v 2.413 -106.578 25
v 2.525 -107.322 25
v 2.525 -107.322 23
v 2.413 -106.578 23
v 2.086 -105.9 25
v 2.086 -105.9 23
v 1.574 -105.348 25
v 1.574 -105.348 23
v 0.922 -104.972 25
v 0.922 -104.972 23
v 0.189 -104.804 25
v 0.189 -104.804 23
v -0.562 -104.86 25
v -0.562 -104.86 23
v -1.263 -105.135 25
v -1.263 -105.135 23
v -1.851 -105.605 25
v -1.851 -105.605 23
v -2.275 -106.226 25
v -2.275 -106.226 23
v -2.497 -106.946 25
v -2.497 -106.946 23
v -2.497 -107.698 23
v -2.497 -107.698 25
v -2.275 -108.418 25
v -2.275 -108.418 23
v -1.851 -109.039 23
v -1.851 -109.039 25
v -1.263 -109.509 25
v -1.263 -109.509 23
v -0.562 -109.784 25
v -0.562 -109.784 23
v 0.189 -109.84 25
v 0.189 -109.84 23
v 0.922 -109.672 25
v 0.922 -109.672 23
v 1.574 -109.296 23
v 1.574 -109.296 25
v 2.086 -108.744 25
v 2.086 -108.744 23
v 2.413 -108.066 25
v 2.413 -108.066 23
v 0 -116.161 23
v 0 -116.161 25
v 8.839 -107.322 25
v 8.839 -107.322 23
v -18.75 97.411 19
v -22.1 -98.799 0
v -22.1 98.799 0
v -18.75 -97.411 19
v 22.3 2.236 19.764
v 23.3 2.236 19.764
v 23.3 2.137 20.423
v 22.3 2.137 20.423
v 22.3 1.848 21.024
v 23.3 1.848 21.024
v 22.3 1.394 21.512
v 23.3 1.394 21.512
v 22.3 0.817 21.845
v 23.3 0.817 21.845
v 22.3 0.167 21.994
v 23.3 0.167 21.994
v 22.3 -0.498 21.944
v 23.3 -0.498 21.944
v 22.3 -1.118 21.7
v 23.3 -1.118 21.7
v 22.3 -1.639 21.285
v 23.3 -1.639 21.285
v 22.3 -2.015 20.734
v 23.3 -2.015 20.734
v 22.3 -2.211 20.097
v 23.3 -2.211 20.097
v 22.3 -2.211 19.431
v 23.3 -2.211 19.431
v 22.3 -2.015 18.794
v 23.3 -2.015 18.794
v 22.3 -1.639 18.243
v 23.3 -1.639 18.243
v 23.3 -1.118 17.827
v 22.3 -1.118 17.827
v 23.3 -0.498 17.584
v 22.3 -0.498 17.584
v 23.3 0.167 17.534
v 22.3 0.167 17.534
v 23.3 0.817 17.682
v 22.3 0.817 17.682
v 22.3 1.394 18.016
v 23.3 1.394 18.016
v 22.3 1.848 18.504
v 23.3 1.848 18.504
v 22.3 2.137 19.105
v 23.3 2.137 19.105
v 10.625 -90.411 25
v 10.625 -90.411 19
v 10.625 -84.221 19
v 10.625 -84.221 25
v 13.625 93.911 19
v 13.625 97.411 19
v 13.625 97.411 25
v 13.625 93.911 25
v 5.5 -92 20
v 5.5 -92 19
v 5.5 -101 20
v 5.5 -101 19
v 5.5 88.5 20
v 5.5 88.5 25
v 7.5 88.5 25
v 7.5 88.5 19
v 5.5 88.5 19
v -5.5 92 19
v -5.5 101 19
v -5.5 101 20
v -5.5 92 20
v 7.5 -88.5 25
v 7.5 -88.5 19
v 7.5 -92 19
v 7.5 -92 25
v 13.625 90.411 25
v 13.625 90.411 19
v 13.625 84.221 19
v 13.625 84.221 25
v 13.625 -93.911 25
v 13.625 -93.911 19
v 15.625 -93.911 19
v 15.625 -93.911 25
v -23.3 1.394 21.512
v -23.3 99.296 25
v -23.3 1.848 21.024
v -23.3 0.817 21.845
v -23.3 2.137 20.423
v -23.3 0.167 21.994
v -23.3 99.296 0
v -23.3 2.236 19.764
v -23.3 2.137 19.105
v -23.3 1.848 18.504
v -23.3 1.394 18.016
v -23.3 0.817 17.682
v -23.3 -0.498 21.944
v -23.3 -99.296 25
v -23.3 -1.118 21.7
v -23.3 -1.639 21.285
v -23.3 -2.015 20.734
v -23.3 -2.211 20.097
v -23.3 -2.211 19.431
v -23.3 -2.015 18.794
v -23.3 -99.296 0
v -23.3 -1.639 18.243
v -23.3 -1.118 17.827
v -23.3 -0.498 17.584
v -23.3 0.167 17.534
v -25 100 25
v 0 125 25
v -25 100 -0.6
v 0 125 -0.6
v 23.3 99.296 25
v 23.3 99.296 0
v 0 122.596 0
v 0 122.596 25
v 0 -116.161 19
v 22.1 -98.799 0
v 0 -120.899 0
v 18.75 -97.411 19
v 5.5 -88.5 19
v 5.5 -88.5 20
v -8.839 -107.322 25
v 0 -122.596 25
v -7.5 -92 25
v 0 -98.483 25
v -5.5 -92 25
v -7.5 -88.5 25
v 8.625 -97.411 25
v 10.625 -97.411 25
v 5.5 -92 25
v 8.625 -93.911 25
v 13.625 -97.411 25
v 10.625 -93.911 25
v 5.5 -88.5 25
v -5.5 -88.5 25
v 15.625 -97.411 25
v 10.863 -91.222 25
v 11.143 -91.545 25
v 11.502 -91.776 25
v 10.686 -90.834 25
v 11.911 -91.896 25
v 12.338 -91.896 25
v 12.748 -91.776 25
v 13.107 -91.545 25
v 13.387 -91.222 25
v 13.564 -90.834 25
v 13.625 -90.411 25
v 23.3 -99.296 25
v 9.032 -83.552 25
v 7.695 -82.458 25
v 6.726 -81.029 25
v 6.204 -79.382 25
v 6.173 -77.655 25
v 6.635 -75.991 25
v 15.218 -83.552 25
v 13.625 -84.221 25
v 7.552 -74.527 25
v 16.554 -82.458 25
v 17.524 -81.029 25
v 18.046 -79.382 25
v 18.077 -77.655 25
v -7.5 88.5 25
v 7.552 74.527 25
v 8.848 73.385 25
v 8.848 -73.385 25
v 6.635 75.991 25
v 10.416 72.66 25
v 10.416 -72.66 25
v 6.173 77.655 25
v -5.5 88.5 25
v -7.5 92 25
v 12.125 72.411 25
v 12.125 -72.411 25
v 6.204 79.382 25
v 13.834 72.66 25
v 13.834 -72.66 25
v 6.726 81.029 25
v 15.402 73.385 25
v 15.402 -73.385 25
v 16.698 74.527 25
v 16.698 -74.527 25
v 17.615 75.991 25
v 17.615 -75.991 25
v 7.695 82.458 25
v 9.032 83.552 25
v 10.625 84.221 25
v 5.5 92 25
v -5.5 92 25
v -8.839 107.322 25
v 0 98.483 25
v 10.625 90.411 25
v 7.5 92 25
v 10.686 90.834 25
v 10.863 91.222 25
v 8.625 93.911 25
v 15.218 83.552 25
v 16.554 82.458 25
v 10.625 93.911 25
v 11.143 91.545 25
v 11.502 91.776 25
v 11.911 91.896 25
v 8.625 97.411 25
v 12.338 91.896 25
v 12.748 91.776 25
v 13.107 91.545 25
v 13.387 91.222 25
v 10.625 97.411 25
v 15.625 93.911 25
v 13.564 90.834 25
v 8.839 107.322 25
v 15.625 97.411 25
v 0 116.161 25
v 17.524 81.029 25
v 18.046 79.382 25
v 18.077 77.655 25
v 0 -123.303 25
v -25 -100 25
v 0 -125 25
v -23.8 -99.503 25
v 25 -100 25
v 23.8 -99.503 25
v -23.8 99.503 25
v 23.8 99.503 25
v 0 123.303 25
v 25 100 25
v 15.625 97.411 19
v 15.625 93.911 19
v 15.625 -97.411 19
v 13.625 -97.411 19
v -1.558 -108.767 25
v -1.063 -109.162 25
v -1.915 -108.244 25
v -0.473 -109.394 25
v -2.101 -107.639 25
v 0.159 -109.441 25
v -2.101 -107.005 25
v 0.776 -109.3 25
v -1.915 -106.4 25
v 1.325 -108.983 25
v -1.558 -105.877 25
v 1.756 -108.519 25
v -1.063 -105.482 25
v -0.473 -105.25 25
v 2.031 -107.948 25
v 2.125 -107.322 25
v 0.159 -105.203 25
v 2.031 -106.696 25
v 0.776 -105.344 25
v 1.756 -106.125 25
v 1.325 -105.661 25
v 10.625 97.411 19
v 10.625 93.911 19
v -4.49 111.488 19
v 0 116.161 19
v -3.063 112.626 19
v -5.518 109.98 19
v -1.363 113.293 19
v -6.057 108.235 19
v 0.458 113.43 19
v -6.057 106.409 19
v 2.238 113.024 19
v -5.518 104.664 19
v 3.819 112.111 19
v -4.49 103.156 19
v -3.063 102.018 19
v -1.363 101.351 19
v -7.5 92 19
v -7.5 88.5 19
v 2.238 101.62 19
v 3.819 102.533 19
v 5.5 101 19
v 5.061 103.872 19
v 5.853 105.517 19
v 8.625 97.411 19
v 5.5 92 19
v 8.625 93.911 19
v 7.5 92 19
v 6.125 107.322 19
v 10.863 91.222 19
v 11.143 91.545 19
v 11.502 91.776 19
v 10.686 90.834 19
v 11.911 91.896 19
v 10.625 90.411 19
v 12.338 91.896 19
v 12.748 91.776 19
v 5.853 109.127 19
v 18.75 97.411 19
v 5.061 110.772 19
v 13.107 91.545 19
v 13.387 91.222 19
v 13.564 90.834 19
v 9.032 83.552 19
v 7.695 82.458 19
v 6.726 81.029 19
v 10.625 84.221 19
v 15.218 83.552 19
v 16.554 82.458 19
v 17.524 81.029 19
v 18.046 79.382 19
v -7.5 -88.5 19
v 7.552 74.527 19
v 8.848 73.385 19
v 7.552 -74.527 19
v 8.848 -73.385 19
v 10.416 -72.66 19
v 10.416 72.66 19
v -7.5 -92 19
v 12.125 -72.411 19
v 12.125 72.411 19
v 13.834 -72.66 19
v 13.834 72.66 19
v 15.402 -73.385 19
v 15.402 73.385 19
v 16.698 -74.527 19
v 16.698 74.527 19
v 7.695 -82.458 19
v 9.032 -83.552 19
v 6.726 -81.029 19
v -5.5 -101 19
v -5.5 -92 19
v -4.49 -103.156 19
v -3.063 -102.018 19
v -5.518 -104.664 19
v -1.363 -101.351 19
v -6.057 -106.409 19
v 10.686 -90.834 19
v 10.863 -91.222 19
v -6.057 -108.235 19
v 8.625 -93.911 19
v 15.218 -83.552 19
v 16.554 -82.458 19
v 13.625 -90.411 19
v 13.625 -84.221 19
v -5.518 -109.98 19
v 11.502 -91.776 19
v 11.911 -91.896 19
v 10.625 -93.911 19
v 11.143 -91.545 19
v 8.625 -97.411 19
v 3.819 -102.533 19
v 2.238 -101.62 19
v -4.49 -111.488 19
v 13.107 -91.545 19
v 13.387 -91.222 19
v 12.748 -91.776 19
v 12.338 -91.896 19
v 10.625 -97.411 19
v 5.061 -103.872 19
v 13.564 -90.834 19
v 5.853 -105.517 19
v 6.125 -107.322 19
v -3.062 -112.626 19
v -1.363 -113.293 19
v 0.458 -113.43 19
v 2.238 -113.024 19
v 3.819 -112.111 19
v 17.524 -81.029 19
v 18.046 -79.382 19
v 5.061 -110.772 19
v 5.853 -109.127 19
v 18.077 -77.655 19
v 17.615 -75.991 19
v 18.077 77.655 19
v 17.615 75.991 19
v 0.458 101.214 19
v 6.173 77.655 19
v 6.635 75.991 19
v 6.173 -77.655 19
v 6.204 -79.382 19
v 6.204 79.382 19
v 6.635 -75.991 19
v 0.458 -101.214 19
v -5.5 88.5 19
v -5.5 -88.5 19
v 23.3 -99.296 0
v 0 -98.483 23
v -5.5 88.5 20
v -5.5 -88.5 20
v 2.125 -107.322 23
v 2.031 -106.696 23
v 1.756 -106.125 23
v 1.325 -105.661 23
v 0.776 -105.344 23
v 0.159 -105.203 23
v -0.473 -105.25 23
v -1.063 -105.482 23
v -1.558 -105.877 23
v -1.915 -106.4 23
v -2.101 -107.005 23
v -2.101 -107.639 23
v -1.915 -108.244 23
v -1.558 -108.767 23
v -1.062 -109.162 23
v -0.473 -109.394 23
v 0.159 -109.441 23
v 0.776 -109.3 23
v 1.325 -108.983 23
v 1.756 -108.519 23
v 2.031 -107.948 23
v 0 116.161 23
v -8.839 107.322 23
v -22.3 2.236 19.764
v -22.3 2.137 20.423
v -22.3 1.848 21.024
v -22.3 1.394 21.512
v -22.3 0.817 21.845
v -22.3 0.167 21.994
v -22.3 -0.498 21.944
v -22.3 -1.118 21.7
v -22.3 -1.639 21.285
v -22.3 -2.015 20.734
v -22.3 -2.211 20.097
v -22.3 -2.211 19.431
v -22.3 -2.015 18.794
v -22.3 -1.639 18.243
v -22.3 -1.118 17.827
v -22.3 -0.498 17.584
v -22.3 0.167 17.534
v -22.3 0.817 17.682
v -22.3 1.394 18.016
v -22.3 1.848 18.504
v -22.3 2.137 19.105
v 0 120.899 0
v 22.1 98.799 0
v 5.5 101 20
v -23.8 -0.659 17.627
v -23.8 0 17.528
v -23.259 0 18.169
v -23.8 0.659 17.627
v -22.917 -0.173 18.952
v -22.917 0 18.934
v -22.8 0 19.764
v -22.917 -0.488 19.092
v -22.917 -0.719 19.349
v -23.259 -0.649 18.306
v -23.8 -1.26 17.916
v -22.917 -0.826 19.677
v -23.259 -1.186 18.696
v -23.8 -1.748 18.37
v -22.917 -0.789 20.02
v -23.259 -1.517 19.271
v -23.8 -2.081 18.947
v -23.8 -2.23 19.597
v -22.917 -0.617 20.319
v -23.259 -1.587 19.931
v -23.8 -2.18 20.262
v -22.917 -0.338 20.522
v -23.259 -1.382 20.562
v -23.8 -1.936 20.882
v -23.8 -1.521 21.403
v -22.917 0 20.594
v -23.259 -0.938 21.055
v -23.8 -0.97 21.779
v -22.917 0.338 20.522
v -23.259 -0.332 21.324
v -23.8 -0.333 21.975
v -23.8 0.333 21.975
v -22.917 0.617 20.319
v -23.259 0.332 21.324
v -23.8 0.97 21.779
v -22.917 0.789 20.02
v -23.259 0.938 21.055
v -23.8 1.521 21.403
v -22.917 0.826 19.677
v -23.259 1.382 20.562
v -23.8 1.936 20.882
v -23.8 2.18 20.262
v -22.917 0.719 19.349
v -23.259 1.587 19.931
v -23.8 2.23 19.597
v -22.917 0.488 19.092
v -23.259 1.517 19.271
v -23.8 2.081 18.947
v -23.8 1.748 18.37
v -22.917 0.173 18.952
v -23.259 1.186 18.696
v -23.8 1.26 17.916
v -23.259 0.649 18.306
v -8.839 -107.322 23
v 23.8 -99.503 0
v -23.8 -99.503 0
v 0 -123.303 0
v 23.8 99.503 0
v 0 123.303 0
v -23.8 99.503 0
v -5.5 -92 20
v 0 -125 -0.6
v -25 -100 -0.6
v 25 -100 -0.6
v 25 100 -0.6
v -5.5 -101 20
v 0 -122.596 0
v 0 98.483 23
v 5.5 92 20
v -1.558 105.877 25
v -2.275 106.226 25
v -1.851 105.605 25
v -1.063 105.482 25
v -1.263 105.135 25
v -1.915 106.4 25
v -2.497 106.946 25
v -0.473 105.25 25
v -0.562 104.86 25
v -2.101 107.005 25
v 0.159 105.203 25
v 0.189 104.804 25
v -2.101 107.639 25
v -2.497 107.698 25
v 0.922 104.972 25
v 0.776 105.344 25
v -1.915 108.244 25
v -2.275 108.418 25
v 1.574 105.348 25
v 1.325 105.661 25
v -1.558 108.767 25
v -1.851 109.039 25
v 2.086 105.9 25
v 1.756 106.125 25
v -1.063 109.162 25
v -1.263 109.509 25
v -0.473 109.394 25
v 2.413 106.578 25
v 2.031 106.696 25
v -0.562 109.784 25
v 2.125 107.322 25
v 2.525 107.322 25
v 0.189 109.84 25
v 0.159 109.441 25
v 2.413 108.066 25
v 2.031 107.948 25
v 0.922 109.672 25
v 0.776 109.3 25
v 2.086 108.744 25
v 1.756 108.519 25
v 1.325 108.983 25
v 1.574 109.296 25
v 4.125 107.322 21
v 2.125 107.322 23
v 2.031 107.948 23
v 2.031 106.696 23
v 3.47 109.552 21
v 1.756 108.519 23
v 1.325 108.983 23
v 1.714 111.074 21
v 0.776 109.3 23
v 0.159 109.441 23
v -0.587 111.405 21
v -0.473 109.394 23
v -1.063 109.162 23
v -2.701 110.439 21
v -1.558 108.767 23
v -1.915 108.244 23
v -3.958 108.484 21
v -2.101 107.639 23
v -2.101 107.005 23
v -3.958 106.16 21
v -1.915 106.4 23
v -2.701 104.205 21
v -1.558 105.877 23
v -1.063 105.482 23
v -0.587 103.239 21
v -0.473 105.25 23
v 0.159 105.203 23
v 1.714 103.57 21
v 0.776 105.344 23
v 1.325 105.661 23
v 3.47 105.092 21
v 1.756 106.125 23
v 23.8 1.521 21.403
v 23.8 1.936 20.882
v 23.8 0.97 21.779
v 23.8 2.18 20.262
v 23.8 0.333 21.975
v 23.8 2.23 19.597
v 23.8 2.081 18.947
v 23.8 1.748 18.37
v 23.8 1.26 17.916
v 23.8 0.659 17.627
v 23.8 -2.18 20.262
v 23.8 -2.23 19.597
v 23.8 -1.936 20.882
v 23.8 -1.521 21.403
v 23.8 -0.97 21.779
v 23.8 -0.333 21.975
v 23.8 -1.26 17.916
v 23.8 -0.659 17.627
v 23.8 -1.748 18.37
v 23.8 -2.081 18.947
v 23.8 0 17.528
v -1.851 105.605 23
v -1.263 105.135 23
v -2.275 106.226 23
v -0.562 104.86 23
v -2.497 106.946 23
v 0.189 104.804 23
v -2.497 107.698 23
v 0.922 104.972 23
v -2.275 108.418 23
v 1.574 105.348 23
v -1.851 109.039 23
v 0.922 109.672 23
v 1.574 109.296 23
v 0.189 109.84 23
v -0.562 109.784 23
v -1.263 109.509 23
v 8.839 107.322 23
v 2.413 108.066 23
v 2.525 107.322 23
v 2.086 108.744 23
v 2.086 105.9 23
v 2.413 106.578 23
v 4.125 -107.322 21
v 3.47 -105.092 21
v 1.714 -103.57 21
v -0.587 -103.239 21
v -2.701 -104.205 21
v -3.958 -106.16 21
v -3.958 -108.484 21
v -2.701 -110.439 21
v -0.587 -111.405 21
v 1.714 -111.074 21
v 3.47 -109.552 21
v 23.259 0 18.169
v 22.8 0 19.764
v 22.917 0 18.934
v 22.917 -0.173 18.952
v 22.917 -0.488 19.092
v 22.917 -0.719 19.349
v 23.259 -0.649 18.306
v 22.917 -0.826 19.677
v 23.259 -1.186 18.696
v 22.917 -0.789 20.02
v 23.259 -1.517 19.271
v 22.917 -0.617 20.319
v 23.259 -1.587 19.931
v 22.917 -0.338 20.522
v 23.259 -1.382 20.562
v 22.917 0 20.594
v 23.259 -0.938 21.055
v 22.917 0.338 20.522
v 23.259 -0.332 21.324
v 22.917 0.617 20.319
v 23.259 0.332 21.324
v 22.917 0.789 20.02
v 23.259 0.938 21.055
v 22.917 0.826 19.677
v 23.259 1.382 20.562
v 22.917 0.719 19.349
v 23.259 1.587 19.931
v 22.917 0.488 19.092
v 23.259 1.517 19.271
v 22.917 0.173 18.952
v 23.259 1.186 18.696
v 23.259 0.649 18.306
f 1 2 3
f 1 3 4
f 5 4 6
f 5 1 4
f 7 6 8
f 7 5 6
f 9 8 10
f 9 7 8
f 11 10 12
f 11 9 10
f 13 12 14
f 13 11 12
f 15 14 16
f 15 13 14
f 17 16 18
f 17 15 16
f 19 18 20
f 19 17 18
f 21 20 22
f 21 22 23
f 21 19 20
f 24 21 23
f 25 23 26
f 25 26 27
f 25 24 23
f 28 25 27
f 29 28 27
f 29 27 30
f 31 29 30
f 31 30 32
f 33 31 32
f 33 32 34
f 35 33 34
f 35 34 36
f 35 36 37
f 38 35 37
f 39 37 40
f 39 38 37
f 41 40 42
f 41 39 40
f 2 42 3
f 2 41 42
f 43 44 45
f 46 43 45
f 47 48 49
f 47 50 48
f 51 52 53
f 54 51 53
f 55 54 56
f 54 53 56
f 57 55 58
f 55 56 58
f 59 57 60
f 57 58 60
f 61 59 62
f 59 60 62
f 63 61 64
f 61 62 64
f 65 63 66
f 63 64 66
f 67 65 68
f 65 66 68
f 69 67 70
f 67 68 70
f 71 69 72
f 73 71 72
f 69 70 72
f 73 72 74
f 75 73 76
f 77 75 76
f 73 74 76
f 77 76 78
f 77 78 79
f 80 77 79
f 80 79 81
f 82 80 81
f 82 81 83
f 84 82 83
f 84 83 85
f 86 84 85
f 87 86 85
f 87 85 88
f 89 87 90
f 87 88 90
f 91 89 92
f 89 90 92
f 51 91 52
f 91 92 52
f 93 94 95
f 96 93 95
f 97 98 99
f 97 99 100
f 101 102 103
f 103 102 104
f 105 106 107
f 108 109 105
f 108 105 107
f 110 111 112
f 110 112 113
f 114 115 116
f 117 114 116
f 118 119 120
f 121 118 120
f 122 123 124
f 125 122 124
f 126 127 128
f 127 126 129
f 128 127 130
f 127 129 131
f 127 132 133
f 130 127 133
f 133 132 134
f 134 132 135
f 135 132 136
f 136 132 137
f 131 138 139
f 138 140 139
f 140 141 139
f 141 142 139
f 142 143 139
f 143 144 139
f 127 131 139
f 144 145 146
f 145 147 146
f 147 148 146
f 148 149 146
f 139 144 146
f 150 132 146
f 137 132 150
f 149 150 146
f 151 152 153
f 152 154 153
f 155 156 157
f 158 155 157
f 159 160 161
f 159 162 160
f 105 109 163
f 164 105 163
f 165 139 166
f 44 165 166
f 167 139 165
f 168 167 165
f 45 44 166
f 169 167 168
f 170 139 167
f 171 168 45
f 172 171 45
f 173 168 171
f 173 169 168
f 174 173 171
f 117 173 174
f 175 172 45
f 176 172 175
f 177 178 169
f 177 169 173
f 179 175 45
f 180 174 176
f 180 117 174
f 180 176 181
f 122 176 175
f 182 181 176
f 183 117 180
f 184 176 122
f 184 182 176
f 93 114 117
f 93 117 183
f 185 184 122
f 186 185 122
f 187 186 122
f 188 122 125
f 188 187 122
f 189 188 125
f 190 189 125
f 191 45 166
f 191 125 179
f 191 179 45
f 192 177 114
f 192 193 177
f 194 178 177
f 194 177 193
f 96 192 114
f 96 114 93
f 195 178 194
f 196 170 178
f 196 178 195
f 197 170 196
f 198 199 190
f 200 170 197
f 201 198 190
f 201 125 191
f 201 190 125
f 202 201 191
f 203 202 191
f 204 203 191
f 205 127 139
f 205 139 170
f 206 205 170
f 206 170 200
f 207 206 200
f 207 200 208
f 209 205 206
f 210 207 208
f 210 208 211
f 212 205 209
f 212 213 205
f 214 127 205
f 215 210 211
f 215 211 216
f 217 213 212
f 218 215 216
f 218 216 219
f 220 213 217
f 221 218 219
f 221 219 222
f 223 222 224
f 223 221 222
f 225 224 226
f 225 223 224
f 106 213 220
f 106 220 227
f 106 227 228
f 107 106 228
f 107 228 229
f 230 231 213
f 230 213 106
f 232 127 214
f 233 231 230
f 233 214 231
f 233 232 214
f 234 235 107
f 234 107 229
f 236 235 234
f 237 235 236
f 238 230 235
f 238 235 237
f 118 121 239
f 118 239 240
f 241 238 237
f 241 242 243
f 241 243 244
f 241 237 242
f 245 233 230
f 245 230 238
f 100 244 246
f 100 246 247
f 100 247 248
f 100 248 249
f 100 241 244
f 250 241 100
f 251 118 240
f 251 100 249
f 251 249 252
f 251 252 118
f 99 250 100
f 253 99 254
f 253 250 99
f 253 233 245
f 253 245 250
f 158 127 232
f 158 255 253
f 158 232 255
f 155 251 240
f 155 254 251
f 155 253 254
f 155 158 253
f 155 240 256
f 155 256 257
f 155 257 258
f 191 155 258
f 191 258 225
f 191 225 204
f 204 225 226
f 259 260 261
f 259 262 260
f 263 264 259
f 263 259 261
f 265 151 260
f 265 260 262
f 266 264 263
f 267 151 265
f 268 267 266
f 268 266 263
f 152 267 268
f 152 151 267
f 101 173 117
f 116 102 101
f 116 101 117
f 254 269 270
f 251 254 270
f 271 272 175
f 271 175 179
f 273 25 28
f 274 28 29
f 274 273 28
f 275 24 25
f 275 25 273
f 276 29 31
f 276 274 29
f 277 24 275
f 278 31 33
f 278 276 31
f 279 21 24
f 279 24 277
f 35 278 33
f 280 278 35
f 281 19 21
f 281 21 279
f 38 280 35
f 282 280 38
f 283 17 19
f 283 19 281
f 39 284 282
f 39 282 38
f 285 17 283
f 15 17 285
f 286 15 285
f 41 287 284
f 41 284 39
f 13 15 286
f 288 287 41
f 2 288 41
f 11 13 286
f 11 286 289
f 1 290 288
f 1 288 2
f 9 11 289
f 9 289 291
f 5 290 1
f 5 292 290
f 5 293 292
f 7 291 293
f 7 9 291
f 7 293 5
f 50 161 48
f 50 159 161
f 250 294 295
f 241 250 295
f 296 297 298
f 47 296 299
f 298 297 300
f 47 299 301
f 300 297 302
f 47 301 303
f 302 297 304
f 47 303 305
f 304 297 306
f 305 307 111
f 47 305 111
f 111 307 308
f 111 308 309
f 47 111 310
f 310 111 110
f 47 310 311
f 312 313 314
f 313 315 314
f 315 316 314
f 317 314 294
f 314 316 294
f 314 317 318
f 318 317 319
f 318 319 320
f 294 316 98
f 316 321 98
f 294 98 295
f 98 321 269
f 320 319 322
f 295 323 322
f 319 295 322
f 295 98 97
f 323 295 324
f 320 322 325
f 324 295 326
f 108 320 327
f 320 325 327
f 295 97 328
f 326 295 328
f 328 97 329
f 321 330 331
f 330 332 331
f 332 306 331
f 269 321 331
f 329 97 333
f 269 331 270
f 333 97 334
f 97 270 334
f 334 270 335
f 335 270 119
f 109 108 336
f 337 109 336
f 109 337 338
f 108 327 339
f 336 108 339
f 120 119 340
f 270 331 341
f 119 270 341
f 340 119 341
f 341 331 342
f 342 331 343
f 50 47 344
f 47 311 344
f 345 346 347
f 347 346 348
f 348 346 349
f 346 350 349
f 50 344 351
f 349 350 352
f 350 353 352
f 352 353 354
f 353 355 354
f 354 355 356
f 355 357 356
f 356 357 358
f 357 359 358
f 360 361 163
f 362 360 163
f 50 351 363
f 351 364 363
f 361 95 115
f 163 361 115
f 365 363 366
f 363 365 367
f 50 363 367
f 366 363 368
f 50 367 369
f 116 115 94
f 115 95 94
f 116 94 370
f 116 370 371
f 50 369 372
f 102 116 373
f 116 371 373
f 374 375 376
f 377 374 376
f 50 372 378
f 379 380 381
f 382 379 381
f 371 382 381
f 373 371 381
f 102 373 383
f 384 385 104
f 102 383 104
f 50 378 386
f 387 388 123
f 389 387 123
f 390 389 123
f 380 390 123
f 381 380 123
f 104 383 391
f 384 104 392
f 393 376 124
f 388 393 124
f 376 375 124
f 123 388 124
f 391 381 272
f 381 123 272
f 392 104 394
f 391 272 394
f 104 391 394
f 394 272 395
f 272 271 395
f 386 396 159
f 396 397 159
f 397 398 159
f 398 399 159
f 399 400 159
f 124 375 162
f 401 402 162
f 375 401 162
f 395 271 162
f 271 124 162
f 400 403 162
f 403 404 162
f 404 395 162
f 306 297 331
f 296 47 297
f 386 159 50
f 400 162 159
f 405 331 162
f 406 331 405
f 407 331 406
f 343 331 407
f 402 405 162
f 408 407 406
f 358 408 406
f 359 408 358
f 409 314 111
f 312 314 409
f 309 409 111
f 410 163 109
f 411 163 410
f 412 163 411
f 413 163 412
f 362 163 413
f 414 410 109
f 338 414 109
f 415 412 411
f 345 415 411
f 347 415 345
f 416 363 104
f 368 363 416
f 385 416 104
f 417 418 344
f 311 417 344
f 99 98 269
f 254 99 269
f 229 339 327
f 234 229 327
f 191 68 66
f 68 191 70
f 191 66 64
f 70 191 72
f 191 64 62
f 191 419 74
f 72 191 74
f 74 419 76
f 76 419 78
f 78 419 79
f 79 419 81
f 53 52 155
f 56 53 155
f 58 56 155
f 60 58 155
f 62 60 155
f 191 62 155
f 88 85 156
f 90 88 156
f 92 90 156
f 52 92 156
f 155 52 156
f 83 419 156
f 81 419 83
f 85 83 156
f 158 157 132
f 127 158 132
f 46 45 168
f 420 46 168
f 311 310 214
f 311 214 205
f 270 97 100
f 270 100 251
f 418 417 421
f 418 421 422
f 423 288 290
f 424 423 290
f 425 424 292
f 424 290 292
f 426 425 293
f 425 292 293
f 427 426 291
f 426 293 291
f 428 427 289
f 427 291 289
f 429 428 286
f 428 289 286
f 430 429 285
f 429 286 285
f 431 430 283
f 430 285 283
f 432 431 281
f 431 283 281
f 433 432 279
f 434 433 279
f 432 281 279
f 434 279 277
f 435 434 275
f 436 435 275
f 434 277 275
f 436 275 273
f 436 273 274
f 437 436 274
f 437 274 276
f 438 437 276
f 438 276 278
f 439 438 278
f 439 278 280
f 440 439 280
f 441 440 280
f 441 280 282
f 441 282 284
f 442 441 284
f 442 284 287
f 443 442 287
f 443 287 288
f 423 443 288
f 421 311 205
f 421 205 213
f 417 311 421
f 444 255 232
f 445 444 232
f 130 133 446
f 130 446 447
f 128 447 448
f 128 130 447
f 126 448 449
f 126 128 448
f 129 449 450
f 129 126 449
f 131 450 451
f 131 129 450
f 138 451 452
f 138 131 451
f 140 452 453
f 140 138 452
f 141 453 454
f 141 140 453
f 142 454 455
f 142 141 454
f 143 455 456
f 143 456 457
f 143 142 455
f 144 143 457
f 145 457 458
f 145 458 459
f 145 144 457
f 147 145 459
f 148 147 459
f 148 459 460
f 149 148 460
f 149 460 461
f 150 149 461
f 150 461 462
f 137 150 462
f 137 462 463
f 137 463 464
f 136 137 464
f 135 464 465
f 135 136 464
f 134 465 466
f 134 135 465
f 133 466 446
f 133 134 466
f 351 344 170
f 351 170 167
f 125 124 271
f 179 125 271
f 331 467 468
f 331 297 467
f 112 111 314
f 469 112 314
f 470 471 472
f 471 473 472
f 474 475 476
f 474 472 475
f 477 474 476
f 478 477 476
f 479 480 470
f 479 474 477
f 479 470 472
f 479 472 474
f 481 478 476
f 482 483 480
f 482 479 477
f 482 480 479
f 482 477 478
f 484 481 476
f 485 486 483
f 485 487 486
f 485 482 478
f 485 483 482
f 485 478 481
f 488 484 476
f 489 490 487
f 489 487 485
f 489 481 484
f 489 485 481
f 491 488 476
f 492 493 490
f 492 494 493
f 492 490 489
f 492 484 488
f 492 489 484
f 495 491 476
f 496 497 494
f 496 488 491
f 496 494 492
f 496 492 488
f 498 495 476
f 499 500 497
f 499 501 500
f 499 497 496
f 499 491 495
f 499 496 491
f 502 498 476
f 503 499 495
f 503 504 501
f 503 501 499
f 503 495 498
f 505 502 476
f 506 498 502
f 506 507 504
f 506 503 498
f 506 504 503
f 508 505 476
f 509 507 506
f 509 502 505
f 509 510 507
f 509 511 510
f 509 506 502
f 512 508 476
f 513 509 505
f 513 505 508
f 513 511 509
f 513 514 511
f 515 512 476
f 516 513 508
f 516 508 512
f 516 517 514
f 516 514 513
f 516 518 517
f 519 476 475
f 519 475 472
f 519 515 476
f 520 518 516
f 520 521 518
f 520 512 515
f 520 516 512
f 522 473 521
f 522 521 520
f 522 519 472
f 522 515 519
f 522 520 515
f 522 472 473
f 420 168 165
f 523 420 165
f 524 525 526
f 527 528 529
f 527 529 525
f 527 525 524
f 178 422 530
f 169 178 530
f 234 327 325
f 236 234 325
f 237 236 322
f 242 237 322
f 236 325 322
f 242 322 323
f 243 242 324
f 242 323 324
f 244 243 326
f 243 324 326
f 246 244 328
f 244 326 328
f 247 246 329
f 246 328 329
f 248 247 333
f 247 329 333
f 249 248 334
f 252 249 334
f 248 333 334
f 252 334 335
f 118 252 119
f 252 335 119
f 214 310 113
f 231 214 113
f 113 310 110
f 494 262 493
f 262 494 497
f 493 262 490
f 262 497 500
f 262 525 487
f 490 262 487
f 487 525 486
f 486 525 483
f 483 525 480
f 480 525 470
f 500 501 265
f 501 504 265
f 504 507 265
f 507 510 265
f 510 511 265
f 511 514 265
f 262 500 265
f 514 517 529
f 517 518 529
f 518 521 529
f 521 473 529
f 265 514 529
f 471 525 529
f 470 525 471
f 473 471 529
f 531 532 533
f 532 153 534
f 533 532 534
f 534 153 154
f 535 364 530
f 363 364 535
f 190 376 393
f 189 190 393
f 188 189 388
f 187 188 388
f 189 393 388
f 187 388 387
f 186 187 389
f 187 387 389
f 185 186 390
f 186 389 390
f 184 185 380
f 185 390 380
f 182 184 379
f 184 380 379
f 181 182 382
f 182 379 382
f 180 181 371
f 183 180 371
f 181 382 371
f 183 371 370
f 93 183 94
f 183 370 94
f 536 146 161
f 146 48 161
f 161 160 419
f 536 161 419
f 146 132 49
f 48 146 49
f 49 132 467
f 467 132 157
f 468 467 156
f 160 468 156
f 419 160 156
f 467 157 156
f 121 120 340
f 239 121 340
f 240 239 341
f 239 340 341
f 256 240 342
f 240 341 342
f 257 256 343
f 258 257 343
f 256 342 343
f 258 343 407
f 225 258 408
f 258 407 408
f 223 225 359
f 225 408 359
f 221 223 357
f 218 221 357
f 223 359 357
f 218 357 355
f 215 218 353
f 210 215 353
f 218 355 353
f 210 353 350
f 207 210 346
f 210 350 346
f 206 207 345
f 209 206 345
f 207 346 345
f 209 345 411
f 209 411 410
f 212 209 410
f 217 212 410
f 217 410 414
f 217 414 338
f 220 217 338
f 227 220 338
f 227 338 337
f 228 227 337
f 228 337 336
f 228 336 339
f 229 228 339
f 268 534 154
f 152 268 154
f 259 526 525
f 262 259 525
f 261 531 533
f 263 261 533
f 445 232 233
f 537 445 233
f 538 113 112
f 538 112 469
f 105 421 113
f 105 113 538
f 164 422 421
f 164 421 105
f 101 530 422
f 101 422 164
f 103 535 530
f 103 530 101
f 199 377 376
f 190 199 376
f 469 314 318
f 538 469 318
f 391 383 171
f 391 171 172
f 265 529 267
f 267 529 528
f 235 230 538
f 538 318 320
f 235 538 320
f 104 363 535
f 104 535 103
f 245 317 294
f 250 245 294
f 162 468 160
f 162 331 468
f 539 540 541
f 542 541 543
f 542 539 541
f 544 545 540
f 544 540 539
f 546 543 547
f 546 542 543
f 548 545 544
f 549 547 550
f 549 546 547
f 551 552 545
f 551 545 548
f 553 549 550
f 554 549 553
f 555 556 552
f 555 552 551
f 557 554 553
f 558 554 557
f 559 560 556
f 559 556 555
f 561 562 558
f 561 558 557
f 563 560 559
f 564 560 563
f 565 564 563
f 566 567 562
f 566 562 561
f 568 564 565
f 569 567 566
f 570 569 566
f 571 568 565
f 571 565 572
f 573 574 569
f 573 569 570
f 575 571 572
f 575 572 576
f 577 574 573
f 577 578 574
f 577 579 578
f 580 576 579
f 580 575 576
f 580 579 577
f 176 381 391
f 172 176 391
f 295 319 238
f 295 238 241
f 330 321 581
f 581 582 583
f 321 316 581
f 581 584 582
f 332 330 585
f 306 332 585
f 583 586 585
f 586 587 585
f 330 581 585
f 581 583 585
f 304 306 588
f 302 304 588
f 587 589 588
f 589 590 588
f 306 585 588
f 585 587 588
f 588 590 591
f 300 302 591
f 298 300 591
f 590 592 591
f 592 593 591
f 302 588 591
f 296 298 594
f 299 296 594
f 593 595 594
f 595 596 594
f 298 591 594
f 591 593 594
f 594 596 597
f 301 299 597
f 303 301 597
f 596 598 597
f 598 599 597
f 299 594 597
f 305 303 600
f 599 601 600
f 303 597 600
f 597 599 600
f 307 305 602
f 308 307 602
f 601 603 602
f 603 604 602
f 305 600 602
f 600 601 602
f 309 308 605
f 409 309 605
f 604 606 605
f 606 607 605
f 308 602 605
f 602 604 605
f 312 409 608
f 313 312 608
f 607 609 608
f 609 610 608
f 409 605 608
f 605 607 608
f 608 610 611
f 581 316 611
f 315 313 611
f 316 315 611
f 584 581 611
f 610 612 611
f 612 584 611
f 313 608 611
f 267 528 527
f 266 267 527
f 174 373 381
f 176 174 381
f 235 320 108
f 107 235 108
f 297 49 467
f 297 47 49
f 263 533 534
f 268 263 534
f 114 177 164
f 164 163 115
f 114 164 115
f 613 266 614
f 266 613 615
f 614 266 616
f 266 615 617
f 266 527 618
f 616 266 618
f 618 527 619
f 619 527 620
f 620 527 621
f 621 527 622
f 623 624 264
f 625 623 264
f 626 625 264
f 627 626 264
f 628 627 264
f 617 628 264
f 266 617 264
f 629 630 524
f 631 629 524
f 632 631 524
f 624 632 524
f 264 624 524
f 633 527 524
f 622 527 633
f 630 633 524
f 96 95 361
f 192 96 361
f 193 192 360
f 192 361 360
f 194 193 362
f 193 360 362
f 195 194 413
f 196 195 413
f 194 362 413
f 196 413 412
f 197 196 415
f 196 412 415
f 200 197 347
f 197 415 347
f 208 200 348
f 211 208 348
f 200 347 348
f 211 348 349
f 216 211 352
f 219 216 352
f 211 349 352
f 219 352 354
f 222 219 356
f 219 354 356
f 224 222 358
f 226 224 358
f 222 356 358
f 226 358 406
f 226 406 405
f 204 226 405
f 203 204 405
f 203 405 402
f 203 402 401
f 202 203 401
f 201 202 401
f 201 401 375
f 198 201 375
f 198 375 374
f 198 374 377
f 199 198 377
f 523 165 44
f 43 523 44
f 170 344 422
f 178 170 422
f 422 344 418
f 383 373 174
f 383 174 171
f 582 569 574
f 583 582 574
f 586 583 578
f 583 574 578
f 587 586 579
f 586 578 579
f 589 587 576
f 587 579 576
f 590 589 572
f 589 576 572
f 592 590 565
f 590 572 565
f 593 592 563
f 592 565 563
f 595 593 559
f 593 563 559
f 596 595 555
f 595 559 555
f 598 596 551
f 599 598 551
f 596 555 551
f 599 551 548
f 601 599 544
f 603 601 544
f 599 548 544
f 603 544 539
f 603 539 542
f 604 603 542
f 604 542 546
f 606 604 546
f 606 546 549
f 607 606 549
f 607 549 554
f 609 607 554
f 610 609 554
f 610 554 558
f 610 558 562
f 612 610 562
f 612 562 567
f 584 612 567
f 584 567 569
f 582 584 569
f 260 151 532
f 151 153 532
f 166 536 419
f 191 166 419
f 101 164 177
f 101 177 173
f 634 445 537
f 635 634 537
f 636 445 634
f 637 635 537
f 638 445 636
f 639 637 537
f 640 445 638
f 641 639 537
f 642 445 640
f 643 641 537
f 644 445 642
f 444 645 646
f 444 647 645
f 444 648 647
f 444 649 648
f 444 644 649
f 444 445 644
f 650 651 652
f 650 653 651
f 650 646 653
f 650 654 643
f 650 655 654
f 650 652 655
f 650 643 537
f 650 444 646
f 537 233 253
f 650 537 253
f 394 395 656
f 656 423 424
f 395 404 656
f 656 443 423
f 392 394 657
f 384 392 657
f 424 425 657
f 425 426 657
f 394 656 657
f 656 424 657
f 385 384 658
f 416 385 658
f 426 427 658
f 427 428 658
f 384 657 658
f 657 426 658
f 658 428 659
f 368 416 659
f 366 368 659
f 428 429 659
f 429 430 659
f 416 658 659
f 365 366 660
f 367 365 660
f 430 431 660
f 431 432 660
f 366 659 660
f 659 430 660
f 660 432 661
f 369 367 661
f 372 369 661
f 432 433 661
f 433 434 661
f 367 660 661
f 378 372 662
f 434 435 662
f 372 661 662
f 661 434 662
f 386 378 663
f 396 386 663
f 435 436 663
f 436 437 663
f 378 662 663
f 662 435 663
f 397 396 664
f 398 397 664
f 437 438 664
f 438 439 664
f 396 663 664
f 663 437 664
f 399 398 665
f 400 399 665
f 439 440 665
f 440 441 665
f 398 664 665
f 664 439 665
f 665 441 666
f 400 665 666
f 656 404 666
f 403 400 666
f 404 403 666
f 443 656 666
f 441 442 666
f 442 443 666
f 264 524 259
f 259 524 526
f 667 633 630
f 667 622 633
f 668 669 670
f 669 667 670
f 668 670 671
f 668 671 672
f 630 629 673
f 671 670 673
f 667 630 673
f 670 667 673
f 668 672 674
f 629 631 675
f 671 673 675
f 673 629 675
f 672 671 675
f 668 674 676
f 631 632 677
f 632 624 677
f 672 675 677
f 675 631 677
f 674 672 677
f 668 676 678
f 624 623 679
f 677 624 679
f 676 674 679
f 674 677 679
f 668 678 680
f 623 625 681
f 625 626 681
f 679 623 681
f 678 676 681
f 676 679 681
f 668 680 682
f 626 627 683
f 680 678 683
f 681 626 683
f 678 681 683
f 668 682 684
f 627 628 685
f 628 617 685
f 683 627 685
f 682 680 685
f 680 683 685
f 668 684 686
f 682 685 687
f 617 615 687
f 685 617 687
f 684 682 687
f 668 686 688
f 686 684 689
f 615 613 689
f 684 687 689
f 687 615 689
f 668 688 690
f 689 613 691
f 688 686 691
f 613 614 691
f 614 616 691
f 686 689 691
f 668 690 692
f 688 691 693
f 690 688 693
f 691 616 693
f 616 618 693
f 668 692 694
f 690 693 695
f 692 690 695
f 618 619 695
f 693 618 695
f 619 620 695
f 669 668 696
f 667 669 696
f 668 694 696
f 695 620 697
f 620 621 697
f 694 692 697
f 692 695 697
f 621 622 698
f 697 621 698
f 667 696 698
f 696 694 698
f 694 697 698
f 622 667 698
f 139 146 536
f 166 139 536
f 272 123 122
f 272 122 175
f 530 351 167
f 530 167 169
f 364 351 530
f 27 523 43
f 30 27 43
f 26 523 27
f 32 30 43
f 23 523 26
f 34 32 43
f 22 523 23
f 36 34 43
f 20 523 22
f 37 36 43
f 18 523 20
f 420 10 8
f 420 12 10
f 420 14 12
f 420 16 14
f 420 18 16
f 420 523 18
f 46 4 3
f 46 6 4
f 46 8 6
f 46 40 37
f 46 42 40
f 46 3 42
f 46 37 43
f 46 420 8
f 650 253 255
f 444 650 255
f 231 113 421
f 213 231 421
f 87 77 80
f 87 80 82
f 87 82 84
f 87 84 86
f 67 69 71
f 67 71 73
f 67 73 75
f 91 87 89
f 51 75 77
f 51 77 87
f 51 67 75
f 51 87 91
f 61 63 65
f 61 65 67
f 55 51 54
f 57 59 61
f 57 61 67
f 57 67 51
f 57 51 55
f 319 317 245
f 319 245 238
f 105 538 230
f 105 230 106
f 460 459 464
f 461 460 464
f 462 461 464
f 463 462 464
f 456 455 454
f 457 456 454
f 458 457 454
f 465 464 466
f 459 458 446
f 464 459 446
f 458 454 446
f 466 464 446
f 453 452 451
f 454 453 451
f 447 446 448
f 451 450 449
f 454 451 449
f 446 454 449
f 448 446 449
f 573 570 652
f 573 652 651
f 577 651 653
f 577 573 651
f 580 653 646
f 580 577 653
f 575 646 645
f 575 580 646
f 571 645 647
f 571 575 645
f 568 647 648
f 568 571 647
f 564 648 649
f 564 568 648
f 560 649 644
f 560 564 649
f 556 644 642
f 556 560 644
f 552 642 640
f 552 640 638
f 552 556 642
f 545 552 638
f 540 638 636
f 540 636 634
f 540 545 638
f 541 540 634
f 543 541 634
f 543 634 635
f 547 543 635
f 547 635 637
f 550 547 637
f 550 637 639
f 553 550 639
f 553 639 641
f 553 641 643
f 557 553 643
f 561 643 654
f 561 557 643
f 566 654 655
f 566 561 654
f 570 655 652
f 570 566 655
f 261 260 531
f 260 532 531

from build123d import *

# Parameters (mm, degrees)
F1_DEPTH       = 0.6
F2_DEPTH       = 25
F6_DEPTH       = 25
F7_R           = 2.2360679775
F8_DEPTH       = 1
F10_DEPTH      = 19
F10_TAPER      = 10
F11_R          = 2.525
F12_DEPTH      = 2
F13_R          = 2.125
F14_DEPTH      = 25.601
F14_DEPTH_BACK = 265
F15_SIZE       = 4
F16_W          = 11
F16_H          = 202
F17_DEPTH      = 1
F18_W          = 2
F18_H          = 3.5
F19_DEPTH      = 6.001


# Not quite as in the source:
# - an extrude ends at something that could not be found from the text; its depth is read off the source's solid
# - a pattern or mirror of a feature is missing from the dataset's text; its kind, count and spacing are read off the source's solid


with BuildPart() as f1:
    # F0 (on Top) → F1 (new body)
    with BuildSketch(Plane.XY):
        Polygon((25, 100), (0, 125), (-25, 100), (-25, -100), (0, -125), (25, -100), align=None)
        Polygon((23.8, 99.5029437252), (23.8, -99.5029437252), (0, -123.3029437252), (-23.8, -99.5029437252), (-23.8, 99.5029437252), (0, 123.3029437252), align=None, mode=Mode.SUBTRACT)
        Polygon((0, -123.3029437252), (23.8, -99.5029437252), (23.8, 99.5029437252), (0, 123.3029437252), (-23.8, 99.5029437252), (-23.8, -99.5029437252), align=None)
    extrude(amount=-F1_DEPTH)

    # F0 (on Top) → F2 (join)
    with BuildSketch(Plane.XY):
        Polygon((25, 100), (0, 125), (-25, 100), (-25, -100), (0, -125), (25, -100), align=None)
        Polygon((23.8, 99.5029437252), (23.8, -99.5029437252), (0, -123.3029437252), (-23.8, -99.5029437252), (-23.8, 99.5029437252), (0, 123.3029437252), align=None, mode=Mode.SUBTRACT)
    extrude(amount=F2_DEPTH)

    # F3 (on Front) → F4 (revolve)
    with BuildSketch(Plane.XZ):
        with BuildLine():
            Line((23.8, 17.527864045), (23.8, 19.7639320225))
            Line((23.8, 19.7639320225), (22.8, 19.7639320225))
            ThreePointArc((22.8, 19.7639320225), (23.0613872125, 18.5391871511), (23.8, 17.527864045))
        make_face()
    f4 = revolve(axis=Axis((23.3, 0, 19.7639320225), (-1, 0, 0)))

    # F4_copies: F4 across plane
    add(f4.mirror(Plane(origin=(0, 0, 0), x_dir=(0, 0, -1), z_dir=(-1, 0, 0))))


with BuildPart() as f6:
    # F5 (on face) → F6 (new body, through all)
    with BuildSketch(Plane.XY):
        Polygon((23.3, 99.295836944), (0, 122.595836944), (-23.3, 99.295836944), (-23.3, -99.295836944), (0, -122.595836944), (23.3, -99.295836944), align=None)
    extrude(amount=F6_DEPTH)

    # F7 (on face) → F8 (cut)
    with BuildSketch(Plane.YZ.offset(23.3)):
        with Locations((0, 19.7639320225)):
            Circle(F7_R)
    f8 = extrude(amount=-F8_DEPTH, mode=Mode.SUBTRACT)

    # F8_copies: F8 across plane
    add(f8.mirror(Plane(origin=(0, 0, 0), x_dir=(0, 0, -1), z_dir=(-1, 0, 0))), mode=Mode.SUBTRACT)

    # F9 (on face) → F10 (cut)
    with BuildSketch(Plane(origin=(0, 0, 0), x_dir=(1, 0, 0), z_dir=(0, 0, -1))):
        Polygon((0, -120.8987806691), (22.1, -98.7987806691), (22.1, 98.7987806691), (0, 120.8987806691), (-22.1, 98.7987806691), (-22.1, -98.7987806691), align=None)
    extrude(amount=-F10_DEPTH, taper=F10_TAPER, mode=Mode.SUBTRACT)

    # F11 (on face) → F12 (cut)
    with BuildSketch(Plane.XY.offset(25)):
        Polygon((8.8388347648, 107.3220297612), (0, 116.160864526), (-8.8388347648, 107.3220297612), (0, 98.4831949964), align=None)
        with Locations((0, 107.3220297612)):
            Circle(F11_R, mode=Mode.SUBTRACT)
        Polygon((-8.8388347648, -107.3220297612), (0, -116.160864526), (8.8388347648, -107.3220297612), (0, -98.4831949964), align=None)
        with Locations((0, -107.3220297612)):
            Circle(F11_R, mode=Mode.SUBTRACT)
    extrude(amount=-F12_DEPTH, mode=Mode.SUBTRACT)

    # F13 (on face) → F14 (cut, two sides)
    with BuildSketch(Plane.XY.offset(25)) as f14_sk:
        with Locations((0, -107.3220297612)):
            Circle(F13_R)
        with Locations((0, 107.3220297612)):
            Circle(F13_R)
    extrude(amount=-F14_DEPTH, mode=Mode.SUBTRACT)
    extrude(f14_sk.sketch, amount=F14_DEPTH_BACK, mode=Mode.SUBTRACT)

    # F15
    f15_edges = [f6.edges().sort_by_distance(p)[0] for p in [
        (-2.125, -107.32203, 19),
        (-2.125, 107.32203, 19),
    ]]
    chamfer(f15_edges, length=F15_SIZE)

    # F16 (on face) → F17 (cut)
    with BuildSketch(Plane(origin=(0, 0, 19), x_dir=(1, 0, 0), z_dir=(0, 0, -1))):
        Rectangle(F16_W, F16_H)
    extrude(amount=-F17_DEPTH, mode=Mode.SUBTRACT)

    # F18 (on face) → F19 (cut, through all)
    with BuildSketch(Plane(origin=(0, 0, 19), x_dir=(1, 0, 0), z_dir=(0, 0, -1))):
        with Locations((-6.5, -90.25)):
            Rectangle(F18_W, F18_H)
        with Locations((6.5, -90.25)):
            Rectangle(F18_W, F18_H)
        with Locations((-6.5, 90.25)):
            Rectangle(F18_W, F18_H)
        with Locations((6.5, 90.25)):
            Rectangle(F18_W, F18_H)
        with BuildLine():
            ThreePointArc((10.6248936833, 84.2205521788), (12.1248936833, 72.4110771595), (13.6248936833, 84.2205521788))
            Line((13.6248936833, 84.2205521788), (13.6248936833, 90.4110771595))
            ThreePointArc((13.6248936833, 90.4110771595), (12.1248936833, 91.9110771595), (10.6248936833, 90.4110771595))
            Line((10.6248936833, 90.4110771595), (10.6248936833, 84.2205521788))
        make_face()
        with Locations((9.6248936833, 95.6610771595)):
            Rectangle(F18_W, F18_H)
        with Locations((14.6248936833, 95.6610771595)):
            Rectangle(F18_W, F18_H)
        with BuildLine():
            Line((13.6248936833, -90.4110771595), (13.6248936833, -84.2205521788))
            ThreePointArc((13.6248936833, -84.2205521788), (12.1248936833, -72.4110771595), (10.6248936833, -84.2205521788))
            Line((10.6248936833, -84.2205521788), (10.6248936833, -90.4110771595))
            ThreePointArc((10.6248936833, -90.4110771595), (12.1248936833, -91.9110771595), (13.6248936833, -90.4110771595))
        make_face()
        with Locations((9.6248936833, -95.6610771595)):
            Rectangle(F18_W, F18_H)
        with Locations((14.6248936833, -95.6610771595)):
            Rectangle(F18_W, F18_H)
    extrude(amount=-F19_DEPTH, mode=Mode.SUBTRACT)


solid = Compound([f1.part, f6.part])
